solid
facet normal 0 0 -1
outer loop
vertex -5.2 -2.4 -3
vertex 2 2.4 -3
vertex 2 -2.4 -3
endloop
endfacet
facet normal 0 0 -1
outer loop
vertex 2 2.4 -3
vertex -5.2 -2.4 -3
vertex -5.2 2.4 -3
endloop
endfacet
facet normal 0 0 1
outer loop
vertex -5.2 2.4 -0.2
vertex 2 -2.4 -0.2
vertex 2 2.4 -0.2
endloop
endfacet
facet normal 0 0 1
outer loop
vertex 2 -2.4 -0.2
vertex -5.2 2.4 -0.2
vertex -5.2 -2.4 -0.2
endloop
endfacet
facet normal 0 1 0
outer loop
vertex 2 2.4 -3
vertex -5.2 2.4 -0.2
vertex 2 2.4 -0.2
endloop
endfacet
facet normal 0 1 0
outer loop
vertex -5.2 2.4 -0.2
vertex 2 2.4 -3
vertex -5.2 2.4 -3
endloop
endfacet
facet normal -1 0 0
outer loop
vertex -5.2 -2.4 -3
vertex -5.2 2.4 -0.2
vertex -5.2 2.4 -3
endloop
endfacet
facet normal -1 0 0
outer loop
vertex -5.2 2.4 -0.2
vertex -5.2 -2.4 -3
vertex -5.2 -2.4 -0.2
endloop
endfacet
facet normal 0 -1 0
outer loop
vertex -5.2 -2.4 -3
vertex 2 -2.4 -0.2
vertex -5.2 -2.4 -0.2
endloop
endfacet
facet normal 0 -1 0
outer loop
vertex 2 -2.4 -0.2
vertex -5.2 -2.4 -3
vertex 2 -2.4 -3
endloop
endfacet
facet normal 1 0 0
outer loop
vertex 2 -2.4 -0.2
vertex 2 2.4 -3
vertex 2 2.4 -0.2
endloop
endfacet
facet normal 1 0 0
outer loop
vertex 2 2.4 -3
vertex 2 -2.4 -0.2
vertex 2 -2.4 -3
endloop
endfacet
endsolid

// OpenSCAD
// file: ../p/box.scad
use <../lib.scad>
function ldraw_lib__box() = [
// 0 Box 6 (six faces)
// 0 Name: box.dat
// 0 Author: James Jessiman
// 0 !LDRAW_ORG Primitive UPDATE 2002-05
// 0 !LICENSE Licensed under CC BY 2.0 and CC BY 4.0 : see CAreadme.txt
// 
// 0 BFC CERTIFY CCW
  [0,"BFC","CERTIFY"],
  [0,"BFC","CCW"],
// 
// 0 !HISTORY 2002-08-22 [sbliss] Applied BFC
// 0 !HISTORY 2002-11-30 [PTadmin] Official Update 2002-05
// 0 !HISTORY 2007-06-24 [PTadmin] Header formatted for Contributor Agreement
// 0 !HISTORY 2008-07-01 [PTadmin] Official Update 2008-01
// 
// 
// 2 24 1 1 1 -1 1 1
  [2,24,1,1,1,-1,1,1],
// 2 24 -1 1 1 -1 1 -1
  [2,24,-1,1,1,-1,1,-1],
// 2 24 -1 1 -1 1 1 -1
  [2,24,-1,1,-1,1,1,-1],
// 2 24 1 1 -1 1 1 1
  [2,24,1,1,-1,1,1,1],
// 2 24 1 -1 1 -1 -1 1
  [2,24,1,-1,1,-1,-1,1],
// 2 24 -1 -1 1 -1 -1 -1
  [2,24,-1,-1,1,-1,-1,-1],
// 2 24 -1 -1 -1 1 -1 -1
  [2,24,-1,-1,-1,1,-1,-1],
// 2 24 1 -1 -1 1 -1 1
  [2,24,1,-1,-1,1,-1,1],
// 2 24 1 -1 1 1 1 1
  [2,24,1,-1,1,1,1,1],
// 2 24 -1 -1 1 -1 1 1
  [2,24,-1,-1,1,-1,1,1],
// 2 24 1 -1 -1 1 1 -1
  [2,24,1,-1,-1,1,1,-1],
// 2 24 -1 -1 -1 -1 1 -1
  [2,24,-1,-1,-1,-1,1,-1],
// 4 16 1 1 1 1 1 -1 -1 1 -1 -1 1 1
  [4,16,1,1,1,1,1,-1,-1,1,-1,-1,1,1],
// 4 16 -1 -1 -1 1 -1 -1 1 -1 1 -1 -1 1
  [4,16,-1,-1,-1,1,-1,-1,1,-1,1,-1,-1,1],
// 4 16 -1 -1 1 1 -1 1 1 1 1 -1 1 1
  [4,16,-1,-1,1,1,-1,1,1,1,1,-1,1,1],
// 4 16 -1 -1 -1 -1 -1 1 -1 1 1 -1 1 -1
  [4,16,-1,-1,-1,-1,-1,1,-1,1,1,-1,1,-1],
// 4 16 1 -1 -1 -1 -1 -1 -1 1 -1 1 1 -1
  [4,16,1,-1,-1,-1,-1,-1,-1,1,-1,1,1,-1],
// 4 16 1 -1 1 1 -1 -1 1 1 -1 1 1 1
  [4,16,1,-1,1,1,-1,-1,1,1,-1,1,1,1],
// 0
];
module ldraw_lib__box(step=0, col=false, unit=2/5, alt=false, line=0.2, solid=!$preview)
    makepoly(ldraw_lib__box(), step=step, col=col, unit=unit, alt=alt, line=line, solid=solid);
ldraw_lib__box(line=0.2);
// main file
use <../lib.scad>
use <../p/box.scad>
function ldraw_lib__t1050() = [
// 0 ~| Circuit Cubes Corner Magnet
// 0 Name: t1050.dat
// 0 Author: Philippe Hurbain [Philo]
// 0 !LDRAW_ORG Part UPDATE 2022-05
// 0 !LICENSE Licensed under CC BY 2.0 and CC BY 4.0 : see CAreadme.txt
// 
// 0 BFC CERTIFY CCW
  [0,"BFC","CERTIFY"],
  [0,"BFC","CCW"],
// 
// 0 !CATEGORY Electric
// 
// 0 !HISTORY 2022-09-15 [PTadmin] Official Update 2022-05
// 
// 
// 1 16 -4 4 0 9 0 0 0 3.5 0 0 0 6 box.dat
  [1,16,-4,4,0,9,0,0,0,3.5,0,0,0,6, ldraw_lib__box()],
];
module ldraw_lib__t1050(step=0, col=false, unit=2/5, alt=false, line=0.2, solid=!$preview)
    makepoly(ldraw_lib__t1050(), step=step, col=col, unit=unit, alt=alt, line=line, solid=solid);
ldraw_lib__t1050(line=0.2);
